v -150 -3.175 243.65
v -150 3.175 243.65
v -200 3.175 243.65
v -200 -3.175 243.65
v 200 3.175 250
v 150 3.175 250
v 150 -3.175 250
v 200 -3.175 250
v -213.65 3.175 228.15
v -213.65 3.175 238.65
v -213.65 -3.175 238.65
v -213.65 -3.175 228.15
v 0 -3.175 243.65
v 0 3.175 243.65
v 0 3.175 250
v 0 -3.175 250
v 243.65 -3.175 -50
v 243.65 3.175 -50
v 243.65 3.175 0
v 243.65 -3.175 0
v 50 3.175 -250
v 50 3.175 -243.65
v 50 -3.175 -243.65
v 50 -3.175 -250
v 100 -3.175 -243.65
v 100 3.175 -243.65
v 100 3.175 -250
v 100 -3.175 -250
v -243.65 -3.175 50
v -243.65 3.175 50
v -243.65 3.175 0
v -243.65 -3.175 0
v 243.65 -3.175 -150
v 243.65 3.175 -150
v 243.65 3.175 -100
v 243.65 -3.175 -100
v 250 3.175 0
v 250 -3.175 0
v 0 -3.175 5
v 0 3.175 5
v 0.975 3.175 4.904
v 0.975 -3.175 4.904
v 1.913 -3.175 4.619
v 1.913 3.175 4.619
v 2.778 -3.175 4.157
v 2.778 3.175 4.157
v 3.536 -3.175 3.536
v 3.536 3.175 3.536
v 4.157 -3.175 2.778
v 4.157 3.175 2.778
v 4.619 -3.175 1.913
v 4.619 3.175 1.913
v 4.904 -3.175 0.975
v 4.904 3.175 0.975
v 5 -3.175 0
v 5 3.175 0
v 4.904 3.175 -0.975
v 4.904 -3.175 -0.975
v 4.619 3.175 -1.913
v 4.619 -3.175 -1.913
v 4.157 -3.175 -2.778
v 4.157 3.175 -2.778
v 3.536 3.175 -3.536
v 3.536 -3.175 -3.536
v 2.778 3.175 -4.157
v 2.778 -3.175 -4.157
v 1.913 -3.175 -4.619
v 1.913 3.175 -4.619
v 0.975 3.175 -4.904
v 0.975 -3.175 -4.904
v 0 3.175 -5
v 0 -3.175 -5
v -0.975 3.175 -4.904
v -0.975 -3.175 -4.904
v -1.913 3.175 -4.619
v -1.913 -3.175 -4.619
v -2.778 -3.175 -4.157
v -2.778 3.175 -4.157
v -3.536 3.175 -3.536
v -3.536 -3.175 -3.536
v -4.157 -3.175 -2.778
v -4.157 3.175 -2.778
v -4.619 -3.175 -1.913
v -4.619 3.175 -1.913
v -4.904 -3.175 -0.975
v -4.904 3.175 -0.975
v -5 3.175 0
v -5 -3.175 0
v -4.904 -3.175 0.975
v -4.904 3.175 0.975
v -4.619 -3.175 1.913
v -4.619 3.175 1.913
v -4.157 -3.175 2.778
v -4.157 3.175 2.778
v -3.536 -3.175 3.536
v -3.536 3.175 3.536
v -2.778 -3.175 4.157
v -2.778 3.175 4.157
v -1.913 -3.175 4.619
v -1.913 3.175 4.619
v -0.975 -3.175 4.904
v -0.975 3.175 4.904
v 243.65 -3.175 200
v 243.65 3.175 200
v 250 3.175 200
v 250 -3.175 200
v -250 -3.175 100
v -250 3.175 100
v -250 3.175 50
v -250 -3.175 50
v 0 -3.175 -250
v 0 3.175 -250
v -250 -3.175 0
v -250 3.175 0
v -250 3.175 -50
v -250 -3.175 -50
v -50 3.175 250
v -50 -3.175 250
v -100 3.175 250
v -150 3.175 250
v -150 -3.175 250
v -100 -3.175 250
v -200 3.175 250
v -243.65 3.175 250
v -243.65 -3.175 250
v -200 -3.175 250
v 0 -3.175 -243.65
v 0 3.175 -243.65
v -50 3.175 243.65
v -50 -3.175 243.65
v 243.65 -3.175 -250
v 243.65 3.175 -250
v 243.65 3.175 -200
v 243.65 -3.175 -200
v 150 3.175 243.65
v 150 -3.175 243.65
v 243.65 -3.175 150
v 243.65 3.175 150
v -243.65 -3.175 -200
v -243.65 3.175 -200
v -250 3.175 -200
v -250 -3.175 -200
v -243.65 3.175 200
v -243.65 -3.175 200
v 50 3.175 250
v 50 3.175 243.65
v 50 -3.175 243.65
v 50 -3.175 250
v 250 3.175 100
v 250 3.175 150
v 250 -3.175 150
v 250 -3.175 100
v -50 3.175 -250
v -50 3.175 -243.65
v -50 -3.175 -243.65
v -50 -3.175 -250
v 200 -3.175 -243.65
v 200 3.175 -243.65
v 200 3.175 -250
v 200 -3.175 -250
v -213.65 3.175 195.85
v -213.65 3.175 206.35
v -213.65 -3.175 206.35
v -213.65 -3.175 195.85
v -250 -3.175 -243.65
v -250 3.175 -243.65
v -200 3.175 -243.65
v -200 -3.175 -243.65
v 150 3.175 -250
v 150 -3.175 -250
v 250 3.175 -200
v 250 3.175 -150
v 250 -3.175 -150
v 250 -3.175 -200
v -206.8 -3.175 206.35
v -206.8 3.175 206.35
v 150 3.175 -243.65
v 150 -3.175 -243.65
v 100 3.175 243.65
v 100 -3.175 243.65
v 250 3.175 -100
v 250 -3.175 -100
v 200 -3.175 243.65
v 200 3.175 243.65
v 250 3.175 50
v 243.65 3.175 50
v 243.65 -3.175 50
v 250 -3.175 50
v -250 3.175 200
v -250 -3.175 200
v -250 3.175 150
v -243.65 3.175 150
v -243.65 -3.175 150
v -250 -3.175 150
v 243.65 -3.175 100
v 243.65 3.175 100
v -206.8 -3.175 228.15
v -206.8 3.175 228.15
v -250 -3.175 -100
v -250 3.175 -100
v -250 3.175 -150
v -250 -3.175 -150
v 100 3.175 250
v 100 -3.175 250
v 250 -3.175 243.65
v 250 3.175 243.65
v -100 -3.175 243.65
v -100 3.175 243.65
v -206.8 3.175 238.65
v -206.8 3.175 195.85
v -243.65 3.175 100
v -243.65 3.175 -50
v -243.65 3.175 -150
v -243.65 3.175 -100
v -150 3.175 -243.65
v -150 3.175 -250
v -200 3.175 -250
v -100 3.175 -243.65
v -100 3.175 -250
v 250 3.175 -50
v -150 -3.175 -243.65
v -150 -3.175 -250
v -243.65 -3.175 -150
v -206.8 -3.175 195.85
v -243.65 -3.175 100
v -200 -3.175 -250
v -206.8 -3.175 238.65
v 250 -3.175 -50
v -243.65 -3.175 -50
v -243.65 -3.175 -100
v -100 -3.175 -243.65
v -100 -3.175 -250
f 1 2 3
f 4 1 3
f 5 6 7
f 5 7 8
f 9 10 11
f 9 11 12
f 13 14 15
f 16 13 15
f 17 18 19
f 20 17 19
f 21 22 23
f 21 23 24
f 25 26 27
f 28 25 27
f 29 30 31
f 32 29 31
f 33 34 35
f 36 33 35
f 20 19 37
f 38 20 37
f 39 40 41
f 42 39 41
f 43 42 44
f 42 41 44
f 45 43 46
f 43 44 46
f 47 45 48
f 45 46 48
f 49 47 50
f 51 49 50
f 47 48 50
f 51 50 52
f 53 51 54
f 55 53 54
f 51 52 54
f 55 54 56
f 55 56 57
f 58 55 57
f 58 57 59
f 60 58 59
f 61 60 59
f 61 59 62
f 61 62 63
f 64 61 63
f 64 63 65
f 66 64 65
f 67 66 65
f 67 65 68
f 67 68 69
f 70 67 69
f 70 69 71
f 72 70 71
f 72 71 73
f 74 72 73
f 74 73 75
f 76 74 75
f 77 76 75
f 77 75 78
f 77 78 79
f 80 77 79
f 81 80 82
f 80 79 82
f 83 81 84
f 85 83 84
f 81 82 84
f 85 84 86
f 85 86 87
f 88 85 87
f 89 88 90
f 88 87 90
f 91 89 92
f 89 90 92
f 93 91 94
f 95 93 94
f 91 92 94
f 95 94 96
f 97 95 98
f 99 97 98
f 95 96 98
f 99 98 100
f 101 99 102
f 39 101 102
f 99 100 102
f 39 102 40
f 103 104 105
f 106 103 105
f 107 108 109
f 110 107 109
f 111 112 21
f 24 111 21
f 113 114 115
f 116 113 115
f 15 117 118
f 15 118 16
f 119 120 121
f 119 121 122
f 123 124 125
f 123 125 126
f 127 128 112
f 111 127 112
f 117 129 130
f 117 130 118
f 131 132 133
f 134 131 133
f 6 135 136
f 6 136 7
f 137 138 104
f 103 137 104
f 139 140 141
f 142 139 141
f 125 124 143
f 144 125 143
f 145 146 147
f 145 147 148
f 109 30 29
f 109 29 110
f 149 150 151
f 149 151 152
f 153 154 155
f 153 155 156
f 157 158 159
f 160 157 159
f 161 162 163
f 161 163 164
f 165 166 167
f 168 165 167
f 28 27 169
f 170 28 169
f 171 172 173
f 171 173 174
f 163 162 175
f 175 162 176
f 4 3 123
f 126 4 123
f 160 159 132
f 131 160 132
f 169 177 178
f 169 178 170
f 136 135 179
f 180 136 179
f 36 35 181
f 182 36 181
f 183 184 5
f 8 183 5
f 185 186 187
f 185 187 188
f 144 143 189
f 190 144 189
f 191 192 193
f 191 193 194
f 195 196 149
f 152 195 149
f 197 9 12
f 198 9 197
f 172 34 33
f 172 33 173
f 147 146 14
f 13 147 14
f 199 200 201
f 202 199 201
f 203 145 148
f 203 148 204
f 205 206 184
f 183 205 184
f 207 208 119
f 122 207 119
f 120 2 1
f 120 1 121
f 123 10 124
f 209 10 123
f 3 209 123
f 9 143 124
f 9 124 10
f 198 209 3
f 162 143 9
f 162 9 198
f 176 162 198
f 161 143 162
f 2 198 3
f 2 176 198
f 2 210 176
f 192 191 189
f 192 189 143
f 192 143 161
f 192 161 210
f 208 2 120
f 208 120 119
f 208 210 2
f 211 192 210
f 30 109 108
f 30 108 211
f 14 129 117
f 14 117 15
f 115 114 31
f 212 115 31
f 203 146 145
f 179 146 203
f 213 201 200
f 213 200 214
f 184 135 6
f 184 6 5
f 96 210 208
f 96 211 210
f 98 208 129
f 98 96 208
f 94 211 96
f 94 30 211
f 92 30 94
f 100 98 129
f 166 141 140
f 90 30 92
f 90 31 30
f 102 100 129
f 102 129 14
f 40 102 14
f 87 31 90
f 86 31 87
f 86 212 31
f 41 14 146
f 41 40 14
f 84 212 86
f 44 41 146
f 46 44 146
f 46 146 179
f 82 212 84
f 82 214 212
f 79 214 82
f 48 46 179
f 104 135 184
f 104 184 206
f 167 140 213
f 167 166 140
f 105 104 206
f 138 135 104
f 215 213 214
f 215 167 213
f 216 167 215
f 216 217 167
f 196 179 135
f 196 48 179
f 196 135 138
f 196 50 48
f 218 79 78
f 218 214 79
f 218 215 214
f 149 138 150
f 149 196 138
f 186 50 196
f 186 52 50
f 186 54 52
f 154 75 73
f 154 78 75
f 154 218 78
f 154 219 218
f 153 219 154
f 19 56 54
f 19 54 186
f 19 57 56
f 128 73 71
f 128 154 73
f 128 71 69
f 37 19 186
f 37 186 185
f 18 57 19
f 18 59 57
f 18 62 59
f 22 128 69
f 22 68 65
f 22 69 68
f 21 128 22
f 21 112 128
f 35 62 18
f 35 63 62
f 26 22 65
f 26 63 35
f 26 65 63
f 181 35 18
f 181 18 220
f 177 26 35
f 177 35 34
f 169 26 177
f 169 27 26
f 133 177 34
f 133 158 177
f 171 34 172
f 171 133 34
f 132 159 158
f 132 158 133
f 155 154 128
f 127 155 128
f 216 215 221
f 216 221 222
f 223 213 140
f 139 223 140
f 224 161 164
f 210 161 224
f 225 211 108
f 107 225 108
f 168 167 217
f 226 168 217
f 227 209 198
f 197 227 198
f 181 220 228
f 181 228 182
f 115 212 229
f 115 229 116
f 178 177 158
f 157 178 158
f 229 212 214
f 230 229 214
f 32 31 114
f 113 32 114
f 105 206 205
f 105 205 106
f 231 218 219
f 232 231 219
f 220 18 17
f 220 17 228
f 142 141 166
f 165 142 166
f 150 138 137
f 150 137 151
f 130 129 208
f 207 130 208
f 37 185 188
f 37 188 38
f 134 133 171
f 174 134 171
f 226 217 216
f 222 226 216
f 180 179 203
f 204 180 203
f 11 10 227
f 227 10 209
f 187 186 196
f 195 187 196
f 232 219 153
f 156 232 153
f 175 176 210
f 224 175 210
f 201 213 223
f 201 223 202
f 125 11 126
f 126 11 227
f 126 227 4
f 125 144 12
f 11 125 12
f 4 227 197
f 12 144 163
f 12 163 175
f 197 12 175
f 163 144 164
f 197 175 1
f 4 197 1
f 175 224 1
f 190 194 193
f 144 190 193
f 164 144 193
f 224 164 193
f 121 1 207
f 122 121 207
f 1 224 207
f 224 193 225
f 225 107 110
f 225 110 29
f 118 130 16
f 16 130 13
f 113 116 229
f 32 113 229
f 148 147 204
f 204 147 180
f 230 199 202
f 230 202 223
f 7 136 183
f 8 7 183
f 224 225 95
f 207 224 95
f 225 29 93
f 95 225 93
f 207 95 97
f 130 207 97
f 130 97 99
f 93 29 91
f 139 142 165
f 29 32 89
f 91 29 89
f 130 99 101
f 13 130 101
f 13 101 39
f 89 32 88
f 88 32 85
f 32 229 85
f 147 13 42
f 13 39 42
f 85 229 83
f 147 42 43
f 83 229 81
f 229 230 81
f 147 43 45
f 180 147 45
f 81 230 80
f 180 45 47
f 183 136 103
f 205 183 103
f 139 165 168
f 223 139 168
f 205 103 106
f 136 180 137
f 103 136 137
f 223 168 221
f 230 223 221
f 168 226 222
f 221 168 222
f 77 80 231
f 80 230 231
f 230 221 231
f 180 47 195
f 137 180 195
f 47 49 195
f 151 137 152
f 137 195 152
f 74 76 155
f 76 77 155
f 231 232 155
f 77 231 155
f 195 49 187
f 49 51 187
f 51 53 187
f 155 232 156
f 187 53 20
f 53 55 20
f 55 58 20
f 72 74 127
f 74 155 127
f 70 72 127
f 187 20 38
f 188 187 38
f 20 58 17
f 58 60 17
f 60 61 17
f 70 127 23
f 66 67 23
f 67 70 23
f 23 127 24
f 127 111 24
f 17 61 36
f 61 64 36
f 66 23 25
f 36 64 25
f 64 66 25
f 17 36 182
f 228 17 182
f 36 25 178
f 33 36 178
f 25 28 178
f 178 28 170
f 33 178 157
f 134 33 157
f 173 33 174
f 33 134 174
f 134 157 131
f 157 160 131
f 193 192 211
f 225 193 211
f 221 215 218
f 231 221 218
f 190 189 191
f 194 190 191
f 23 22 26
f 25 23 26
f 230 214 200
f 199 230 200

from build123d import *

# Parameters (mm, degrees)
SKETCH1_W                    = 500
SKETCH1_H                    = 500
BOSS_EXTRUDE1_DEPTH          = 3.175
SKETCH2_W                    = 50
SKETCH2_H                    = 6.35
CUT_EXTRUDE1_DEPTH           = 354.610410622
LPATTERN1_COUNT              = 5
LPATTERN1_PITCH              = 100
SKETCH3_R                    = 5
CUT_EXTRUDE2_DEPTH           = 354.610410622
CIRPATTERN1_COUNT            = 4
CIRPATTERN1_COPY_1_SKETCH_W  = 50
CIRPATTERN1_COPY_1_SKETCH_H  = 6.35
CIRPATTERN1_COPY_1_DEPTH     = 354.610410622
CIRPATTERN1_COPY_2_SKETCH_W  = 50
CIRPATTERN1_COPY_2_SKETCH_H  = 6.35
CIRPATTERN1_COPY_2_DEPTH     = 354.610410622
CIRPATTERN1_COPY_3_SKETCH_W  = 50
CIRPATTERN1_COPY_3_SKETCH_H  = 6.35
CIRPATTERN1_COPY_3_DEPTH     = 354.610410622
CIRPATTERN1_COPY_4_SKETCH_W  = 50
CIRPATTERN1_COPY_4_SKETCH_H  = 6.35
CIRPATTERN1_COPY_4_DEPTH     = 354.610410622
CIRPATTERN1_COPY_5_SKETCH_W  = 50
CIRPATTERN1_COPY_5_SKETCH_H  = 6.35
CIRPATTERN1_COPY_5_DEPTH     = 354.610410622
CIRPATTERN1_COPY_6_SKETCH_W  = 50
CIRPATTERN1_COPY_6_SKETCH_H  = 6.35
CIRPATTERN1_COPY_6_DEPTH     = 354.610410622
CIRPATTERN1_COPY_7_SKETCH_W  = 50
CIRPATTERN1_COPY_7_SKETCH_H  = 6.35
CIRPATTERN1_COPY_7_DEPTH     = 354.610410622
CIRPATTERN1_COPY_8_SKETCH_W  = 50
CIRPATTERN1_COPY_8_SKETCH_H  = 6.35
CIRPATTERN1_COPY_8_DEPTH     = 354.610410622
CIRPATTERN1_COPY_9_SKETCH_W  = 50
CIRPATTERN1_COPY_9_SKETCH_H  = 6.35
CIRPATTERN1_COPY_9_DEPTH     = 354.610410622
CIRPATTERN1_COPY_10_SKETCH_W = 50
CIRPATTERN1_COPY_10_SKETCH_H = 6.35
CIRPATTERN1_COPY_10_DEPTH    = 354.610410622
CIRPATTERN1_COPY_11_SKETCH_W = 50
CIRPATTERN1_COPY_11_SKETCH_H = 6.35
CIRPATTERN1_COPY_11_DEPTH    = 354.610410622
CIRPATTERN1_COPY_12_SKETCH_W = 50
CIRPATTERN1_COPY_12_SKETCH_H = 6.35
CIRPATTERN1_COPY_12_DEPTH    = 354.610410622
SKETCH5_W                    = 6.85
SKETCH5_H                    = 10.5
CUT_EXTRUDE3_DEPTH           = 354.610410622


with BuildPart() as part:
    # Sketch1 → Boss-Extrude1 (new, symmetric)
    with BuildSketch(Plane(origin=(0, 0, 0), x_dir=(1, 0, 0), z_dir=(0, 1, 0))):
        Rectangle(SKETCH1_W, SKETCH1_H)
    extrude(amount=BOSS_EXTRUDE1_DEPTH, both=True)

    # Sketch2 → Cut-Extrude1 (cut, through all)
    with BuildSketch(Plane(origin=(0, 3.175, 0), x_dir=(1, 0, 0), z_dir=(0, 1, 0))):
        with Locations((-225, 246.825)):
            Rectangle(SKETCH2_W, SKETCH2_H)
    cut_extrude1 = extrude(amount=-CUT_EXTRUDE1_DEPTH, mode=Mode.SUBTRACT)

    # LPattern1: Cut-Extrude1 ×5
    with Locations(*[(i * LPATTERN1_PITCH, 0, 0) for i in range(1, LPATTERN1_COUNT)]):
        add(cut_extrude1, mode=Mode.SUBTRACT)

    # Sketch3 → Cut-Extrude2 (cut, through all)
    with BuildSketch(Plane(origin=(0, 3.175, 0), x_dir=(1, 0, 0), z_dir=(0, 1, 0))):
        with Locations(Location((0, 0, 0), (0, 0, 270))):
            Circle(SKETCH3_R)
    extrude(amount=-CUT_EXTRUDE2_DEPTH, mode=Mode.SUBTRACT)

    # CirPattern1: Cut-Extrude1 ×4 about axis
    cirpattern1_axis = Axis((0, 0, 0), (0, 1, 0))
    for i in range(1, CIRPATTERN1_COUNT):
        add(cut_extrude1.rotate(cirpattern1_axis, i * 360 / CIRPATTERN1_COUNT), mode=Mode.SUBTRACT)

    # CirPattern1 copy 1 sketch → CirPattern1 copy 1 (cut, through all)
    with BuildSketch(Plane(origin=(0, 3.175, -100), x_dir=(0, 0, -1), z_dir=(0, 1, 0))):
        with Locations((-225, 246.825)):
            Rectangle(CIRPATTERN1_COPY_1_SKETCH_W, CIRPATTERN1_COPY_1_SKETCH_H)
    extrude(amount=-CIRPATTERN1_COPY_1_DEPTH, mode=Mode.SUBTRACT)

    # CirPattern1 copy 2 sketch → CirPattern1 copy 2 (cut, through all)
    with BuildSketch(Plane(origin=(-100, 3.175, 0), x_dir=(-1, 0, 0), z_dir=(0, 1, 0))):
        with Locations((-225, 246.825)):
            Rectangle(CIRPATTERN1_COPY_2_SKETCH_W, CIRPATTERN1_COPY_2_SKETCH_H)
    extrude(amount=-CIRPATTERN1_COPY_2_DEPTH, mode=Mode.SUBTRACT)

    # CirPattern1 copy 3 sketch → CirPattern1 copy 3 (cut, through all)
    with BuildSketch(Plane(origin=(0, 3.175, 100), x_dir=(0, 0, 1), z_dir=(0, 1, 0))):
        with Locations((-225, 246.825)):
            Rectangle(CIRPATTERN1_COPY_3_SKETCH_W, CIRPATTERN1_COPY_3_SKETCH_H)
    extrude(amount=-CIRPATTERN1_COPY_3_DEPTH, mode=Mode.SUBTRACT)

    # CirPattern1 copy 4 sketch → CirPattern1 copy 4 (cut, through all)
    with BuildSketch(Plane(origin=(0, 3.175, -200), x_dir=(0, 0, -1), z_dir=(0, 1, 0))):
        with Locations((-225, 246.825)):
            Rectangle(CIRPATTERN1_COPY_4_SKETCH_W, CIRPATTERN1_COPY_4_SKETCH_H)
    extrude(amount=-CIRPATTERN1_COPY_4_DEPTH, mode=Mode.SUBTRACT)

    # CirPattern1 copy 5 sketch → CirPattern1 copy 5 (cut, through all)
    with BuildSketch(Plane(origin=(-200, 3.175, 0), x_dir=(-1, 0, 0), z_dir=(0, 1, 0))):
        with Locations((-225, 246.825)):
            Rectangle(CIRPATTERN1_COPY_5_SKETCH_W, CIRPATTERN1_COPY_5_SKETCH_H)
    extrude(amount=-CIRPATTERN1_COPY_5_DEPTH, mode=Mode.SUBTRACT)

    # CirPattern1 copy 6 sketch → CirPattern1 copy 6 (cut, through all)
    with BuildSketch(Plane(origin=(0, 3.175, 200), x_dir=(0, 0, 1), z_dir=(0, 1, 0))):
        with Locations((-225, 246.825)):
            Rectangle(CIRPATTERN1_COPY_6_SKETCH_W, CIRPATTERN1_COPY_6_SKETCH_H)
    extrude(amount=-CIRPATTERN1_COPY_6_DEPTH, mode=Mode.SUBTRACT)

    # CirPattern1 copy 7 sketch → CirPattern1 copy 7 (cut, through all)
    with BuildSketch(Plane(origin=(0, 3.175, -300), x_dir=(0, 0, -1), z_dir=(0, 1, 0))):
        with Locations((-225, 246.825)):
            Rectangle(CIRPATTERN1_COPY_7_SKETCH_W, CIRPATTERN1_COPY_7_SKETCH_H)
    extrude(amount=-CIRPATTERN1_COPY_7_DEPTH, mode=Mode.SUBTRACT)

    # CirPattern1 copy 8 sketch → CirPattern1 copy 8 (cut, through all)
    with BuildSketch(Plane(origin=(-300, 3.175, 0), x_dir=(-1, 0, 0), z_dir=(0, 1, 0))):
        with Locations((-225, 246.825)):
            Rectangle(CIRPATTERN1_COPY_8_SKETCH_W, CIRPATTERN1_COPY_8_SKETCH_H)
    extrude(amount=-CIRPATTERN1_COPY_8_DEPTH, mode=Mode.SUBTRACT)

    # CirPattern1 copy 9 sketch → CirPattern1 copy 9 (cut, through all)
    with BuildSketch(Plane(origin=(0, 3.175, 300), x_dir=(0, 0, 1), z_dir=(0, 1, 0))):
        with Locations((-225, 246.825)):
            Rectangle(CIRPATTERN1_COPY_9_SKETCH_W, CIRPATTERN1_COPY_9_SKETCH_H)
    extrude(amount=-CIRPATTERN1_COPY_9_DEPTH, mode=Mode.SUBTRACT)

    # CirPattern1 copy 10 sketch → CirPattern1 copy 10 (cut, through all)
    with BuildSketch(Plane(origin=(0, 3.175, -400), x_dir=(0, 0, -1), z_dir=(0, 1, 0))):
        with Locations((-225, 246.825)):
            Rectangle(CIRPATTERN1_COPY_10_SKETCH_W, CIRPATTERN1_COPY_10_SKETCH_H)
    extrude(amount=-CIRPATTERN1_COPY_10_DEPTH, mode=Mode.SUBTRACT)

    # CirPattern1 copy 11 sketch → CirPattern1 copy 11 (cut, through all)
    with BuildSketch(Plane(origin=(-400, 3.175, 0), x_dir=(-1, 0, 0), z_dir=(0, 1, 0))):
        with Locations((-225, 246.825)):
            Rectangle(CIRPATTERN1_COPY_11_SKETCH_W, CIRPATTERN1_COPY_11_SKETCH_H)
    extrude(amount=-CIRPATTERN1_COPY_11_DEPTH, mode=Mode.SUBTRACT)

    # CirPattern1 copy 12 sketch → CirPattern1 copy 12 (cut, through all)
    with BuildSketch(Plane(origin=(0, 3.175, 400), x_dir=(0, 0, 1), z_dir=(0, 1, 0))):
        with Locations((-225, 246.825)):
            Rectangle(CIRPATTERN1_COPY_12_SKETCH_W, CIRPATTERN1_COPY_12_SKETCH_H)
    extrude(amount=-CIRPATTERN1_COPY_12_DEPTH, mode=Mode.SUBTRACT)

    # Sketch5 → Cut-Extrude3 (cut, through all)
    with BuildSketch(Plane(origin=(0, 3.175, 0), x_dir=(1, 0, 0), z_dir=(0, 1, 0))):
        with Locations((-210.225, -201.1)):
            Rectangle(SKETCH5_W, SKETCH5_H)
        with Locations((-210.225, -233.4)):
            Rectangle(SKETCH5_W, SKETCH5_H)
    extrude(amount=-CUT_EXTRUDE3_DEPTH, mode=Mode.SUBTRACT)


solid = part.part
